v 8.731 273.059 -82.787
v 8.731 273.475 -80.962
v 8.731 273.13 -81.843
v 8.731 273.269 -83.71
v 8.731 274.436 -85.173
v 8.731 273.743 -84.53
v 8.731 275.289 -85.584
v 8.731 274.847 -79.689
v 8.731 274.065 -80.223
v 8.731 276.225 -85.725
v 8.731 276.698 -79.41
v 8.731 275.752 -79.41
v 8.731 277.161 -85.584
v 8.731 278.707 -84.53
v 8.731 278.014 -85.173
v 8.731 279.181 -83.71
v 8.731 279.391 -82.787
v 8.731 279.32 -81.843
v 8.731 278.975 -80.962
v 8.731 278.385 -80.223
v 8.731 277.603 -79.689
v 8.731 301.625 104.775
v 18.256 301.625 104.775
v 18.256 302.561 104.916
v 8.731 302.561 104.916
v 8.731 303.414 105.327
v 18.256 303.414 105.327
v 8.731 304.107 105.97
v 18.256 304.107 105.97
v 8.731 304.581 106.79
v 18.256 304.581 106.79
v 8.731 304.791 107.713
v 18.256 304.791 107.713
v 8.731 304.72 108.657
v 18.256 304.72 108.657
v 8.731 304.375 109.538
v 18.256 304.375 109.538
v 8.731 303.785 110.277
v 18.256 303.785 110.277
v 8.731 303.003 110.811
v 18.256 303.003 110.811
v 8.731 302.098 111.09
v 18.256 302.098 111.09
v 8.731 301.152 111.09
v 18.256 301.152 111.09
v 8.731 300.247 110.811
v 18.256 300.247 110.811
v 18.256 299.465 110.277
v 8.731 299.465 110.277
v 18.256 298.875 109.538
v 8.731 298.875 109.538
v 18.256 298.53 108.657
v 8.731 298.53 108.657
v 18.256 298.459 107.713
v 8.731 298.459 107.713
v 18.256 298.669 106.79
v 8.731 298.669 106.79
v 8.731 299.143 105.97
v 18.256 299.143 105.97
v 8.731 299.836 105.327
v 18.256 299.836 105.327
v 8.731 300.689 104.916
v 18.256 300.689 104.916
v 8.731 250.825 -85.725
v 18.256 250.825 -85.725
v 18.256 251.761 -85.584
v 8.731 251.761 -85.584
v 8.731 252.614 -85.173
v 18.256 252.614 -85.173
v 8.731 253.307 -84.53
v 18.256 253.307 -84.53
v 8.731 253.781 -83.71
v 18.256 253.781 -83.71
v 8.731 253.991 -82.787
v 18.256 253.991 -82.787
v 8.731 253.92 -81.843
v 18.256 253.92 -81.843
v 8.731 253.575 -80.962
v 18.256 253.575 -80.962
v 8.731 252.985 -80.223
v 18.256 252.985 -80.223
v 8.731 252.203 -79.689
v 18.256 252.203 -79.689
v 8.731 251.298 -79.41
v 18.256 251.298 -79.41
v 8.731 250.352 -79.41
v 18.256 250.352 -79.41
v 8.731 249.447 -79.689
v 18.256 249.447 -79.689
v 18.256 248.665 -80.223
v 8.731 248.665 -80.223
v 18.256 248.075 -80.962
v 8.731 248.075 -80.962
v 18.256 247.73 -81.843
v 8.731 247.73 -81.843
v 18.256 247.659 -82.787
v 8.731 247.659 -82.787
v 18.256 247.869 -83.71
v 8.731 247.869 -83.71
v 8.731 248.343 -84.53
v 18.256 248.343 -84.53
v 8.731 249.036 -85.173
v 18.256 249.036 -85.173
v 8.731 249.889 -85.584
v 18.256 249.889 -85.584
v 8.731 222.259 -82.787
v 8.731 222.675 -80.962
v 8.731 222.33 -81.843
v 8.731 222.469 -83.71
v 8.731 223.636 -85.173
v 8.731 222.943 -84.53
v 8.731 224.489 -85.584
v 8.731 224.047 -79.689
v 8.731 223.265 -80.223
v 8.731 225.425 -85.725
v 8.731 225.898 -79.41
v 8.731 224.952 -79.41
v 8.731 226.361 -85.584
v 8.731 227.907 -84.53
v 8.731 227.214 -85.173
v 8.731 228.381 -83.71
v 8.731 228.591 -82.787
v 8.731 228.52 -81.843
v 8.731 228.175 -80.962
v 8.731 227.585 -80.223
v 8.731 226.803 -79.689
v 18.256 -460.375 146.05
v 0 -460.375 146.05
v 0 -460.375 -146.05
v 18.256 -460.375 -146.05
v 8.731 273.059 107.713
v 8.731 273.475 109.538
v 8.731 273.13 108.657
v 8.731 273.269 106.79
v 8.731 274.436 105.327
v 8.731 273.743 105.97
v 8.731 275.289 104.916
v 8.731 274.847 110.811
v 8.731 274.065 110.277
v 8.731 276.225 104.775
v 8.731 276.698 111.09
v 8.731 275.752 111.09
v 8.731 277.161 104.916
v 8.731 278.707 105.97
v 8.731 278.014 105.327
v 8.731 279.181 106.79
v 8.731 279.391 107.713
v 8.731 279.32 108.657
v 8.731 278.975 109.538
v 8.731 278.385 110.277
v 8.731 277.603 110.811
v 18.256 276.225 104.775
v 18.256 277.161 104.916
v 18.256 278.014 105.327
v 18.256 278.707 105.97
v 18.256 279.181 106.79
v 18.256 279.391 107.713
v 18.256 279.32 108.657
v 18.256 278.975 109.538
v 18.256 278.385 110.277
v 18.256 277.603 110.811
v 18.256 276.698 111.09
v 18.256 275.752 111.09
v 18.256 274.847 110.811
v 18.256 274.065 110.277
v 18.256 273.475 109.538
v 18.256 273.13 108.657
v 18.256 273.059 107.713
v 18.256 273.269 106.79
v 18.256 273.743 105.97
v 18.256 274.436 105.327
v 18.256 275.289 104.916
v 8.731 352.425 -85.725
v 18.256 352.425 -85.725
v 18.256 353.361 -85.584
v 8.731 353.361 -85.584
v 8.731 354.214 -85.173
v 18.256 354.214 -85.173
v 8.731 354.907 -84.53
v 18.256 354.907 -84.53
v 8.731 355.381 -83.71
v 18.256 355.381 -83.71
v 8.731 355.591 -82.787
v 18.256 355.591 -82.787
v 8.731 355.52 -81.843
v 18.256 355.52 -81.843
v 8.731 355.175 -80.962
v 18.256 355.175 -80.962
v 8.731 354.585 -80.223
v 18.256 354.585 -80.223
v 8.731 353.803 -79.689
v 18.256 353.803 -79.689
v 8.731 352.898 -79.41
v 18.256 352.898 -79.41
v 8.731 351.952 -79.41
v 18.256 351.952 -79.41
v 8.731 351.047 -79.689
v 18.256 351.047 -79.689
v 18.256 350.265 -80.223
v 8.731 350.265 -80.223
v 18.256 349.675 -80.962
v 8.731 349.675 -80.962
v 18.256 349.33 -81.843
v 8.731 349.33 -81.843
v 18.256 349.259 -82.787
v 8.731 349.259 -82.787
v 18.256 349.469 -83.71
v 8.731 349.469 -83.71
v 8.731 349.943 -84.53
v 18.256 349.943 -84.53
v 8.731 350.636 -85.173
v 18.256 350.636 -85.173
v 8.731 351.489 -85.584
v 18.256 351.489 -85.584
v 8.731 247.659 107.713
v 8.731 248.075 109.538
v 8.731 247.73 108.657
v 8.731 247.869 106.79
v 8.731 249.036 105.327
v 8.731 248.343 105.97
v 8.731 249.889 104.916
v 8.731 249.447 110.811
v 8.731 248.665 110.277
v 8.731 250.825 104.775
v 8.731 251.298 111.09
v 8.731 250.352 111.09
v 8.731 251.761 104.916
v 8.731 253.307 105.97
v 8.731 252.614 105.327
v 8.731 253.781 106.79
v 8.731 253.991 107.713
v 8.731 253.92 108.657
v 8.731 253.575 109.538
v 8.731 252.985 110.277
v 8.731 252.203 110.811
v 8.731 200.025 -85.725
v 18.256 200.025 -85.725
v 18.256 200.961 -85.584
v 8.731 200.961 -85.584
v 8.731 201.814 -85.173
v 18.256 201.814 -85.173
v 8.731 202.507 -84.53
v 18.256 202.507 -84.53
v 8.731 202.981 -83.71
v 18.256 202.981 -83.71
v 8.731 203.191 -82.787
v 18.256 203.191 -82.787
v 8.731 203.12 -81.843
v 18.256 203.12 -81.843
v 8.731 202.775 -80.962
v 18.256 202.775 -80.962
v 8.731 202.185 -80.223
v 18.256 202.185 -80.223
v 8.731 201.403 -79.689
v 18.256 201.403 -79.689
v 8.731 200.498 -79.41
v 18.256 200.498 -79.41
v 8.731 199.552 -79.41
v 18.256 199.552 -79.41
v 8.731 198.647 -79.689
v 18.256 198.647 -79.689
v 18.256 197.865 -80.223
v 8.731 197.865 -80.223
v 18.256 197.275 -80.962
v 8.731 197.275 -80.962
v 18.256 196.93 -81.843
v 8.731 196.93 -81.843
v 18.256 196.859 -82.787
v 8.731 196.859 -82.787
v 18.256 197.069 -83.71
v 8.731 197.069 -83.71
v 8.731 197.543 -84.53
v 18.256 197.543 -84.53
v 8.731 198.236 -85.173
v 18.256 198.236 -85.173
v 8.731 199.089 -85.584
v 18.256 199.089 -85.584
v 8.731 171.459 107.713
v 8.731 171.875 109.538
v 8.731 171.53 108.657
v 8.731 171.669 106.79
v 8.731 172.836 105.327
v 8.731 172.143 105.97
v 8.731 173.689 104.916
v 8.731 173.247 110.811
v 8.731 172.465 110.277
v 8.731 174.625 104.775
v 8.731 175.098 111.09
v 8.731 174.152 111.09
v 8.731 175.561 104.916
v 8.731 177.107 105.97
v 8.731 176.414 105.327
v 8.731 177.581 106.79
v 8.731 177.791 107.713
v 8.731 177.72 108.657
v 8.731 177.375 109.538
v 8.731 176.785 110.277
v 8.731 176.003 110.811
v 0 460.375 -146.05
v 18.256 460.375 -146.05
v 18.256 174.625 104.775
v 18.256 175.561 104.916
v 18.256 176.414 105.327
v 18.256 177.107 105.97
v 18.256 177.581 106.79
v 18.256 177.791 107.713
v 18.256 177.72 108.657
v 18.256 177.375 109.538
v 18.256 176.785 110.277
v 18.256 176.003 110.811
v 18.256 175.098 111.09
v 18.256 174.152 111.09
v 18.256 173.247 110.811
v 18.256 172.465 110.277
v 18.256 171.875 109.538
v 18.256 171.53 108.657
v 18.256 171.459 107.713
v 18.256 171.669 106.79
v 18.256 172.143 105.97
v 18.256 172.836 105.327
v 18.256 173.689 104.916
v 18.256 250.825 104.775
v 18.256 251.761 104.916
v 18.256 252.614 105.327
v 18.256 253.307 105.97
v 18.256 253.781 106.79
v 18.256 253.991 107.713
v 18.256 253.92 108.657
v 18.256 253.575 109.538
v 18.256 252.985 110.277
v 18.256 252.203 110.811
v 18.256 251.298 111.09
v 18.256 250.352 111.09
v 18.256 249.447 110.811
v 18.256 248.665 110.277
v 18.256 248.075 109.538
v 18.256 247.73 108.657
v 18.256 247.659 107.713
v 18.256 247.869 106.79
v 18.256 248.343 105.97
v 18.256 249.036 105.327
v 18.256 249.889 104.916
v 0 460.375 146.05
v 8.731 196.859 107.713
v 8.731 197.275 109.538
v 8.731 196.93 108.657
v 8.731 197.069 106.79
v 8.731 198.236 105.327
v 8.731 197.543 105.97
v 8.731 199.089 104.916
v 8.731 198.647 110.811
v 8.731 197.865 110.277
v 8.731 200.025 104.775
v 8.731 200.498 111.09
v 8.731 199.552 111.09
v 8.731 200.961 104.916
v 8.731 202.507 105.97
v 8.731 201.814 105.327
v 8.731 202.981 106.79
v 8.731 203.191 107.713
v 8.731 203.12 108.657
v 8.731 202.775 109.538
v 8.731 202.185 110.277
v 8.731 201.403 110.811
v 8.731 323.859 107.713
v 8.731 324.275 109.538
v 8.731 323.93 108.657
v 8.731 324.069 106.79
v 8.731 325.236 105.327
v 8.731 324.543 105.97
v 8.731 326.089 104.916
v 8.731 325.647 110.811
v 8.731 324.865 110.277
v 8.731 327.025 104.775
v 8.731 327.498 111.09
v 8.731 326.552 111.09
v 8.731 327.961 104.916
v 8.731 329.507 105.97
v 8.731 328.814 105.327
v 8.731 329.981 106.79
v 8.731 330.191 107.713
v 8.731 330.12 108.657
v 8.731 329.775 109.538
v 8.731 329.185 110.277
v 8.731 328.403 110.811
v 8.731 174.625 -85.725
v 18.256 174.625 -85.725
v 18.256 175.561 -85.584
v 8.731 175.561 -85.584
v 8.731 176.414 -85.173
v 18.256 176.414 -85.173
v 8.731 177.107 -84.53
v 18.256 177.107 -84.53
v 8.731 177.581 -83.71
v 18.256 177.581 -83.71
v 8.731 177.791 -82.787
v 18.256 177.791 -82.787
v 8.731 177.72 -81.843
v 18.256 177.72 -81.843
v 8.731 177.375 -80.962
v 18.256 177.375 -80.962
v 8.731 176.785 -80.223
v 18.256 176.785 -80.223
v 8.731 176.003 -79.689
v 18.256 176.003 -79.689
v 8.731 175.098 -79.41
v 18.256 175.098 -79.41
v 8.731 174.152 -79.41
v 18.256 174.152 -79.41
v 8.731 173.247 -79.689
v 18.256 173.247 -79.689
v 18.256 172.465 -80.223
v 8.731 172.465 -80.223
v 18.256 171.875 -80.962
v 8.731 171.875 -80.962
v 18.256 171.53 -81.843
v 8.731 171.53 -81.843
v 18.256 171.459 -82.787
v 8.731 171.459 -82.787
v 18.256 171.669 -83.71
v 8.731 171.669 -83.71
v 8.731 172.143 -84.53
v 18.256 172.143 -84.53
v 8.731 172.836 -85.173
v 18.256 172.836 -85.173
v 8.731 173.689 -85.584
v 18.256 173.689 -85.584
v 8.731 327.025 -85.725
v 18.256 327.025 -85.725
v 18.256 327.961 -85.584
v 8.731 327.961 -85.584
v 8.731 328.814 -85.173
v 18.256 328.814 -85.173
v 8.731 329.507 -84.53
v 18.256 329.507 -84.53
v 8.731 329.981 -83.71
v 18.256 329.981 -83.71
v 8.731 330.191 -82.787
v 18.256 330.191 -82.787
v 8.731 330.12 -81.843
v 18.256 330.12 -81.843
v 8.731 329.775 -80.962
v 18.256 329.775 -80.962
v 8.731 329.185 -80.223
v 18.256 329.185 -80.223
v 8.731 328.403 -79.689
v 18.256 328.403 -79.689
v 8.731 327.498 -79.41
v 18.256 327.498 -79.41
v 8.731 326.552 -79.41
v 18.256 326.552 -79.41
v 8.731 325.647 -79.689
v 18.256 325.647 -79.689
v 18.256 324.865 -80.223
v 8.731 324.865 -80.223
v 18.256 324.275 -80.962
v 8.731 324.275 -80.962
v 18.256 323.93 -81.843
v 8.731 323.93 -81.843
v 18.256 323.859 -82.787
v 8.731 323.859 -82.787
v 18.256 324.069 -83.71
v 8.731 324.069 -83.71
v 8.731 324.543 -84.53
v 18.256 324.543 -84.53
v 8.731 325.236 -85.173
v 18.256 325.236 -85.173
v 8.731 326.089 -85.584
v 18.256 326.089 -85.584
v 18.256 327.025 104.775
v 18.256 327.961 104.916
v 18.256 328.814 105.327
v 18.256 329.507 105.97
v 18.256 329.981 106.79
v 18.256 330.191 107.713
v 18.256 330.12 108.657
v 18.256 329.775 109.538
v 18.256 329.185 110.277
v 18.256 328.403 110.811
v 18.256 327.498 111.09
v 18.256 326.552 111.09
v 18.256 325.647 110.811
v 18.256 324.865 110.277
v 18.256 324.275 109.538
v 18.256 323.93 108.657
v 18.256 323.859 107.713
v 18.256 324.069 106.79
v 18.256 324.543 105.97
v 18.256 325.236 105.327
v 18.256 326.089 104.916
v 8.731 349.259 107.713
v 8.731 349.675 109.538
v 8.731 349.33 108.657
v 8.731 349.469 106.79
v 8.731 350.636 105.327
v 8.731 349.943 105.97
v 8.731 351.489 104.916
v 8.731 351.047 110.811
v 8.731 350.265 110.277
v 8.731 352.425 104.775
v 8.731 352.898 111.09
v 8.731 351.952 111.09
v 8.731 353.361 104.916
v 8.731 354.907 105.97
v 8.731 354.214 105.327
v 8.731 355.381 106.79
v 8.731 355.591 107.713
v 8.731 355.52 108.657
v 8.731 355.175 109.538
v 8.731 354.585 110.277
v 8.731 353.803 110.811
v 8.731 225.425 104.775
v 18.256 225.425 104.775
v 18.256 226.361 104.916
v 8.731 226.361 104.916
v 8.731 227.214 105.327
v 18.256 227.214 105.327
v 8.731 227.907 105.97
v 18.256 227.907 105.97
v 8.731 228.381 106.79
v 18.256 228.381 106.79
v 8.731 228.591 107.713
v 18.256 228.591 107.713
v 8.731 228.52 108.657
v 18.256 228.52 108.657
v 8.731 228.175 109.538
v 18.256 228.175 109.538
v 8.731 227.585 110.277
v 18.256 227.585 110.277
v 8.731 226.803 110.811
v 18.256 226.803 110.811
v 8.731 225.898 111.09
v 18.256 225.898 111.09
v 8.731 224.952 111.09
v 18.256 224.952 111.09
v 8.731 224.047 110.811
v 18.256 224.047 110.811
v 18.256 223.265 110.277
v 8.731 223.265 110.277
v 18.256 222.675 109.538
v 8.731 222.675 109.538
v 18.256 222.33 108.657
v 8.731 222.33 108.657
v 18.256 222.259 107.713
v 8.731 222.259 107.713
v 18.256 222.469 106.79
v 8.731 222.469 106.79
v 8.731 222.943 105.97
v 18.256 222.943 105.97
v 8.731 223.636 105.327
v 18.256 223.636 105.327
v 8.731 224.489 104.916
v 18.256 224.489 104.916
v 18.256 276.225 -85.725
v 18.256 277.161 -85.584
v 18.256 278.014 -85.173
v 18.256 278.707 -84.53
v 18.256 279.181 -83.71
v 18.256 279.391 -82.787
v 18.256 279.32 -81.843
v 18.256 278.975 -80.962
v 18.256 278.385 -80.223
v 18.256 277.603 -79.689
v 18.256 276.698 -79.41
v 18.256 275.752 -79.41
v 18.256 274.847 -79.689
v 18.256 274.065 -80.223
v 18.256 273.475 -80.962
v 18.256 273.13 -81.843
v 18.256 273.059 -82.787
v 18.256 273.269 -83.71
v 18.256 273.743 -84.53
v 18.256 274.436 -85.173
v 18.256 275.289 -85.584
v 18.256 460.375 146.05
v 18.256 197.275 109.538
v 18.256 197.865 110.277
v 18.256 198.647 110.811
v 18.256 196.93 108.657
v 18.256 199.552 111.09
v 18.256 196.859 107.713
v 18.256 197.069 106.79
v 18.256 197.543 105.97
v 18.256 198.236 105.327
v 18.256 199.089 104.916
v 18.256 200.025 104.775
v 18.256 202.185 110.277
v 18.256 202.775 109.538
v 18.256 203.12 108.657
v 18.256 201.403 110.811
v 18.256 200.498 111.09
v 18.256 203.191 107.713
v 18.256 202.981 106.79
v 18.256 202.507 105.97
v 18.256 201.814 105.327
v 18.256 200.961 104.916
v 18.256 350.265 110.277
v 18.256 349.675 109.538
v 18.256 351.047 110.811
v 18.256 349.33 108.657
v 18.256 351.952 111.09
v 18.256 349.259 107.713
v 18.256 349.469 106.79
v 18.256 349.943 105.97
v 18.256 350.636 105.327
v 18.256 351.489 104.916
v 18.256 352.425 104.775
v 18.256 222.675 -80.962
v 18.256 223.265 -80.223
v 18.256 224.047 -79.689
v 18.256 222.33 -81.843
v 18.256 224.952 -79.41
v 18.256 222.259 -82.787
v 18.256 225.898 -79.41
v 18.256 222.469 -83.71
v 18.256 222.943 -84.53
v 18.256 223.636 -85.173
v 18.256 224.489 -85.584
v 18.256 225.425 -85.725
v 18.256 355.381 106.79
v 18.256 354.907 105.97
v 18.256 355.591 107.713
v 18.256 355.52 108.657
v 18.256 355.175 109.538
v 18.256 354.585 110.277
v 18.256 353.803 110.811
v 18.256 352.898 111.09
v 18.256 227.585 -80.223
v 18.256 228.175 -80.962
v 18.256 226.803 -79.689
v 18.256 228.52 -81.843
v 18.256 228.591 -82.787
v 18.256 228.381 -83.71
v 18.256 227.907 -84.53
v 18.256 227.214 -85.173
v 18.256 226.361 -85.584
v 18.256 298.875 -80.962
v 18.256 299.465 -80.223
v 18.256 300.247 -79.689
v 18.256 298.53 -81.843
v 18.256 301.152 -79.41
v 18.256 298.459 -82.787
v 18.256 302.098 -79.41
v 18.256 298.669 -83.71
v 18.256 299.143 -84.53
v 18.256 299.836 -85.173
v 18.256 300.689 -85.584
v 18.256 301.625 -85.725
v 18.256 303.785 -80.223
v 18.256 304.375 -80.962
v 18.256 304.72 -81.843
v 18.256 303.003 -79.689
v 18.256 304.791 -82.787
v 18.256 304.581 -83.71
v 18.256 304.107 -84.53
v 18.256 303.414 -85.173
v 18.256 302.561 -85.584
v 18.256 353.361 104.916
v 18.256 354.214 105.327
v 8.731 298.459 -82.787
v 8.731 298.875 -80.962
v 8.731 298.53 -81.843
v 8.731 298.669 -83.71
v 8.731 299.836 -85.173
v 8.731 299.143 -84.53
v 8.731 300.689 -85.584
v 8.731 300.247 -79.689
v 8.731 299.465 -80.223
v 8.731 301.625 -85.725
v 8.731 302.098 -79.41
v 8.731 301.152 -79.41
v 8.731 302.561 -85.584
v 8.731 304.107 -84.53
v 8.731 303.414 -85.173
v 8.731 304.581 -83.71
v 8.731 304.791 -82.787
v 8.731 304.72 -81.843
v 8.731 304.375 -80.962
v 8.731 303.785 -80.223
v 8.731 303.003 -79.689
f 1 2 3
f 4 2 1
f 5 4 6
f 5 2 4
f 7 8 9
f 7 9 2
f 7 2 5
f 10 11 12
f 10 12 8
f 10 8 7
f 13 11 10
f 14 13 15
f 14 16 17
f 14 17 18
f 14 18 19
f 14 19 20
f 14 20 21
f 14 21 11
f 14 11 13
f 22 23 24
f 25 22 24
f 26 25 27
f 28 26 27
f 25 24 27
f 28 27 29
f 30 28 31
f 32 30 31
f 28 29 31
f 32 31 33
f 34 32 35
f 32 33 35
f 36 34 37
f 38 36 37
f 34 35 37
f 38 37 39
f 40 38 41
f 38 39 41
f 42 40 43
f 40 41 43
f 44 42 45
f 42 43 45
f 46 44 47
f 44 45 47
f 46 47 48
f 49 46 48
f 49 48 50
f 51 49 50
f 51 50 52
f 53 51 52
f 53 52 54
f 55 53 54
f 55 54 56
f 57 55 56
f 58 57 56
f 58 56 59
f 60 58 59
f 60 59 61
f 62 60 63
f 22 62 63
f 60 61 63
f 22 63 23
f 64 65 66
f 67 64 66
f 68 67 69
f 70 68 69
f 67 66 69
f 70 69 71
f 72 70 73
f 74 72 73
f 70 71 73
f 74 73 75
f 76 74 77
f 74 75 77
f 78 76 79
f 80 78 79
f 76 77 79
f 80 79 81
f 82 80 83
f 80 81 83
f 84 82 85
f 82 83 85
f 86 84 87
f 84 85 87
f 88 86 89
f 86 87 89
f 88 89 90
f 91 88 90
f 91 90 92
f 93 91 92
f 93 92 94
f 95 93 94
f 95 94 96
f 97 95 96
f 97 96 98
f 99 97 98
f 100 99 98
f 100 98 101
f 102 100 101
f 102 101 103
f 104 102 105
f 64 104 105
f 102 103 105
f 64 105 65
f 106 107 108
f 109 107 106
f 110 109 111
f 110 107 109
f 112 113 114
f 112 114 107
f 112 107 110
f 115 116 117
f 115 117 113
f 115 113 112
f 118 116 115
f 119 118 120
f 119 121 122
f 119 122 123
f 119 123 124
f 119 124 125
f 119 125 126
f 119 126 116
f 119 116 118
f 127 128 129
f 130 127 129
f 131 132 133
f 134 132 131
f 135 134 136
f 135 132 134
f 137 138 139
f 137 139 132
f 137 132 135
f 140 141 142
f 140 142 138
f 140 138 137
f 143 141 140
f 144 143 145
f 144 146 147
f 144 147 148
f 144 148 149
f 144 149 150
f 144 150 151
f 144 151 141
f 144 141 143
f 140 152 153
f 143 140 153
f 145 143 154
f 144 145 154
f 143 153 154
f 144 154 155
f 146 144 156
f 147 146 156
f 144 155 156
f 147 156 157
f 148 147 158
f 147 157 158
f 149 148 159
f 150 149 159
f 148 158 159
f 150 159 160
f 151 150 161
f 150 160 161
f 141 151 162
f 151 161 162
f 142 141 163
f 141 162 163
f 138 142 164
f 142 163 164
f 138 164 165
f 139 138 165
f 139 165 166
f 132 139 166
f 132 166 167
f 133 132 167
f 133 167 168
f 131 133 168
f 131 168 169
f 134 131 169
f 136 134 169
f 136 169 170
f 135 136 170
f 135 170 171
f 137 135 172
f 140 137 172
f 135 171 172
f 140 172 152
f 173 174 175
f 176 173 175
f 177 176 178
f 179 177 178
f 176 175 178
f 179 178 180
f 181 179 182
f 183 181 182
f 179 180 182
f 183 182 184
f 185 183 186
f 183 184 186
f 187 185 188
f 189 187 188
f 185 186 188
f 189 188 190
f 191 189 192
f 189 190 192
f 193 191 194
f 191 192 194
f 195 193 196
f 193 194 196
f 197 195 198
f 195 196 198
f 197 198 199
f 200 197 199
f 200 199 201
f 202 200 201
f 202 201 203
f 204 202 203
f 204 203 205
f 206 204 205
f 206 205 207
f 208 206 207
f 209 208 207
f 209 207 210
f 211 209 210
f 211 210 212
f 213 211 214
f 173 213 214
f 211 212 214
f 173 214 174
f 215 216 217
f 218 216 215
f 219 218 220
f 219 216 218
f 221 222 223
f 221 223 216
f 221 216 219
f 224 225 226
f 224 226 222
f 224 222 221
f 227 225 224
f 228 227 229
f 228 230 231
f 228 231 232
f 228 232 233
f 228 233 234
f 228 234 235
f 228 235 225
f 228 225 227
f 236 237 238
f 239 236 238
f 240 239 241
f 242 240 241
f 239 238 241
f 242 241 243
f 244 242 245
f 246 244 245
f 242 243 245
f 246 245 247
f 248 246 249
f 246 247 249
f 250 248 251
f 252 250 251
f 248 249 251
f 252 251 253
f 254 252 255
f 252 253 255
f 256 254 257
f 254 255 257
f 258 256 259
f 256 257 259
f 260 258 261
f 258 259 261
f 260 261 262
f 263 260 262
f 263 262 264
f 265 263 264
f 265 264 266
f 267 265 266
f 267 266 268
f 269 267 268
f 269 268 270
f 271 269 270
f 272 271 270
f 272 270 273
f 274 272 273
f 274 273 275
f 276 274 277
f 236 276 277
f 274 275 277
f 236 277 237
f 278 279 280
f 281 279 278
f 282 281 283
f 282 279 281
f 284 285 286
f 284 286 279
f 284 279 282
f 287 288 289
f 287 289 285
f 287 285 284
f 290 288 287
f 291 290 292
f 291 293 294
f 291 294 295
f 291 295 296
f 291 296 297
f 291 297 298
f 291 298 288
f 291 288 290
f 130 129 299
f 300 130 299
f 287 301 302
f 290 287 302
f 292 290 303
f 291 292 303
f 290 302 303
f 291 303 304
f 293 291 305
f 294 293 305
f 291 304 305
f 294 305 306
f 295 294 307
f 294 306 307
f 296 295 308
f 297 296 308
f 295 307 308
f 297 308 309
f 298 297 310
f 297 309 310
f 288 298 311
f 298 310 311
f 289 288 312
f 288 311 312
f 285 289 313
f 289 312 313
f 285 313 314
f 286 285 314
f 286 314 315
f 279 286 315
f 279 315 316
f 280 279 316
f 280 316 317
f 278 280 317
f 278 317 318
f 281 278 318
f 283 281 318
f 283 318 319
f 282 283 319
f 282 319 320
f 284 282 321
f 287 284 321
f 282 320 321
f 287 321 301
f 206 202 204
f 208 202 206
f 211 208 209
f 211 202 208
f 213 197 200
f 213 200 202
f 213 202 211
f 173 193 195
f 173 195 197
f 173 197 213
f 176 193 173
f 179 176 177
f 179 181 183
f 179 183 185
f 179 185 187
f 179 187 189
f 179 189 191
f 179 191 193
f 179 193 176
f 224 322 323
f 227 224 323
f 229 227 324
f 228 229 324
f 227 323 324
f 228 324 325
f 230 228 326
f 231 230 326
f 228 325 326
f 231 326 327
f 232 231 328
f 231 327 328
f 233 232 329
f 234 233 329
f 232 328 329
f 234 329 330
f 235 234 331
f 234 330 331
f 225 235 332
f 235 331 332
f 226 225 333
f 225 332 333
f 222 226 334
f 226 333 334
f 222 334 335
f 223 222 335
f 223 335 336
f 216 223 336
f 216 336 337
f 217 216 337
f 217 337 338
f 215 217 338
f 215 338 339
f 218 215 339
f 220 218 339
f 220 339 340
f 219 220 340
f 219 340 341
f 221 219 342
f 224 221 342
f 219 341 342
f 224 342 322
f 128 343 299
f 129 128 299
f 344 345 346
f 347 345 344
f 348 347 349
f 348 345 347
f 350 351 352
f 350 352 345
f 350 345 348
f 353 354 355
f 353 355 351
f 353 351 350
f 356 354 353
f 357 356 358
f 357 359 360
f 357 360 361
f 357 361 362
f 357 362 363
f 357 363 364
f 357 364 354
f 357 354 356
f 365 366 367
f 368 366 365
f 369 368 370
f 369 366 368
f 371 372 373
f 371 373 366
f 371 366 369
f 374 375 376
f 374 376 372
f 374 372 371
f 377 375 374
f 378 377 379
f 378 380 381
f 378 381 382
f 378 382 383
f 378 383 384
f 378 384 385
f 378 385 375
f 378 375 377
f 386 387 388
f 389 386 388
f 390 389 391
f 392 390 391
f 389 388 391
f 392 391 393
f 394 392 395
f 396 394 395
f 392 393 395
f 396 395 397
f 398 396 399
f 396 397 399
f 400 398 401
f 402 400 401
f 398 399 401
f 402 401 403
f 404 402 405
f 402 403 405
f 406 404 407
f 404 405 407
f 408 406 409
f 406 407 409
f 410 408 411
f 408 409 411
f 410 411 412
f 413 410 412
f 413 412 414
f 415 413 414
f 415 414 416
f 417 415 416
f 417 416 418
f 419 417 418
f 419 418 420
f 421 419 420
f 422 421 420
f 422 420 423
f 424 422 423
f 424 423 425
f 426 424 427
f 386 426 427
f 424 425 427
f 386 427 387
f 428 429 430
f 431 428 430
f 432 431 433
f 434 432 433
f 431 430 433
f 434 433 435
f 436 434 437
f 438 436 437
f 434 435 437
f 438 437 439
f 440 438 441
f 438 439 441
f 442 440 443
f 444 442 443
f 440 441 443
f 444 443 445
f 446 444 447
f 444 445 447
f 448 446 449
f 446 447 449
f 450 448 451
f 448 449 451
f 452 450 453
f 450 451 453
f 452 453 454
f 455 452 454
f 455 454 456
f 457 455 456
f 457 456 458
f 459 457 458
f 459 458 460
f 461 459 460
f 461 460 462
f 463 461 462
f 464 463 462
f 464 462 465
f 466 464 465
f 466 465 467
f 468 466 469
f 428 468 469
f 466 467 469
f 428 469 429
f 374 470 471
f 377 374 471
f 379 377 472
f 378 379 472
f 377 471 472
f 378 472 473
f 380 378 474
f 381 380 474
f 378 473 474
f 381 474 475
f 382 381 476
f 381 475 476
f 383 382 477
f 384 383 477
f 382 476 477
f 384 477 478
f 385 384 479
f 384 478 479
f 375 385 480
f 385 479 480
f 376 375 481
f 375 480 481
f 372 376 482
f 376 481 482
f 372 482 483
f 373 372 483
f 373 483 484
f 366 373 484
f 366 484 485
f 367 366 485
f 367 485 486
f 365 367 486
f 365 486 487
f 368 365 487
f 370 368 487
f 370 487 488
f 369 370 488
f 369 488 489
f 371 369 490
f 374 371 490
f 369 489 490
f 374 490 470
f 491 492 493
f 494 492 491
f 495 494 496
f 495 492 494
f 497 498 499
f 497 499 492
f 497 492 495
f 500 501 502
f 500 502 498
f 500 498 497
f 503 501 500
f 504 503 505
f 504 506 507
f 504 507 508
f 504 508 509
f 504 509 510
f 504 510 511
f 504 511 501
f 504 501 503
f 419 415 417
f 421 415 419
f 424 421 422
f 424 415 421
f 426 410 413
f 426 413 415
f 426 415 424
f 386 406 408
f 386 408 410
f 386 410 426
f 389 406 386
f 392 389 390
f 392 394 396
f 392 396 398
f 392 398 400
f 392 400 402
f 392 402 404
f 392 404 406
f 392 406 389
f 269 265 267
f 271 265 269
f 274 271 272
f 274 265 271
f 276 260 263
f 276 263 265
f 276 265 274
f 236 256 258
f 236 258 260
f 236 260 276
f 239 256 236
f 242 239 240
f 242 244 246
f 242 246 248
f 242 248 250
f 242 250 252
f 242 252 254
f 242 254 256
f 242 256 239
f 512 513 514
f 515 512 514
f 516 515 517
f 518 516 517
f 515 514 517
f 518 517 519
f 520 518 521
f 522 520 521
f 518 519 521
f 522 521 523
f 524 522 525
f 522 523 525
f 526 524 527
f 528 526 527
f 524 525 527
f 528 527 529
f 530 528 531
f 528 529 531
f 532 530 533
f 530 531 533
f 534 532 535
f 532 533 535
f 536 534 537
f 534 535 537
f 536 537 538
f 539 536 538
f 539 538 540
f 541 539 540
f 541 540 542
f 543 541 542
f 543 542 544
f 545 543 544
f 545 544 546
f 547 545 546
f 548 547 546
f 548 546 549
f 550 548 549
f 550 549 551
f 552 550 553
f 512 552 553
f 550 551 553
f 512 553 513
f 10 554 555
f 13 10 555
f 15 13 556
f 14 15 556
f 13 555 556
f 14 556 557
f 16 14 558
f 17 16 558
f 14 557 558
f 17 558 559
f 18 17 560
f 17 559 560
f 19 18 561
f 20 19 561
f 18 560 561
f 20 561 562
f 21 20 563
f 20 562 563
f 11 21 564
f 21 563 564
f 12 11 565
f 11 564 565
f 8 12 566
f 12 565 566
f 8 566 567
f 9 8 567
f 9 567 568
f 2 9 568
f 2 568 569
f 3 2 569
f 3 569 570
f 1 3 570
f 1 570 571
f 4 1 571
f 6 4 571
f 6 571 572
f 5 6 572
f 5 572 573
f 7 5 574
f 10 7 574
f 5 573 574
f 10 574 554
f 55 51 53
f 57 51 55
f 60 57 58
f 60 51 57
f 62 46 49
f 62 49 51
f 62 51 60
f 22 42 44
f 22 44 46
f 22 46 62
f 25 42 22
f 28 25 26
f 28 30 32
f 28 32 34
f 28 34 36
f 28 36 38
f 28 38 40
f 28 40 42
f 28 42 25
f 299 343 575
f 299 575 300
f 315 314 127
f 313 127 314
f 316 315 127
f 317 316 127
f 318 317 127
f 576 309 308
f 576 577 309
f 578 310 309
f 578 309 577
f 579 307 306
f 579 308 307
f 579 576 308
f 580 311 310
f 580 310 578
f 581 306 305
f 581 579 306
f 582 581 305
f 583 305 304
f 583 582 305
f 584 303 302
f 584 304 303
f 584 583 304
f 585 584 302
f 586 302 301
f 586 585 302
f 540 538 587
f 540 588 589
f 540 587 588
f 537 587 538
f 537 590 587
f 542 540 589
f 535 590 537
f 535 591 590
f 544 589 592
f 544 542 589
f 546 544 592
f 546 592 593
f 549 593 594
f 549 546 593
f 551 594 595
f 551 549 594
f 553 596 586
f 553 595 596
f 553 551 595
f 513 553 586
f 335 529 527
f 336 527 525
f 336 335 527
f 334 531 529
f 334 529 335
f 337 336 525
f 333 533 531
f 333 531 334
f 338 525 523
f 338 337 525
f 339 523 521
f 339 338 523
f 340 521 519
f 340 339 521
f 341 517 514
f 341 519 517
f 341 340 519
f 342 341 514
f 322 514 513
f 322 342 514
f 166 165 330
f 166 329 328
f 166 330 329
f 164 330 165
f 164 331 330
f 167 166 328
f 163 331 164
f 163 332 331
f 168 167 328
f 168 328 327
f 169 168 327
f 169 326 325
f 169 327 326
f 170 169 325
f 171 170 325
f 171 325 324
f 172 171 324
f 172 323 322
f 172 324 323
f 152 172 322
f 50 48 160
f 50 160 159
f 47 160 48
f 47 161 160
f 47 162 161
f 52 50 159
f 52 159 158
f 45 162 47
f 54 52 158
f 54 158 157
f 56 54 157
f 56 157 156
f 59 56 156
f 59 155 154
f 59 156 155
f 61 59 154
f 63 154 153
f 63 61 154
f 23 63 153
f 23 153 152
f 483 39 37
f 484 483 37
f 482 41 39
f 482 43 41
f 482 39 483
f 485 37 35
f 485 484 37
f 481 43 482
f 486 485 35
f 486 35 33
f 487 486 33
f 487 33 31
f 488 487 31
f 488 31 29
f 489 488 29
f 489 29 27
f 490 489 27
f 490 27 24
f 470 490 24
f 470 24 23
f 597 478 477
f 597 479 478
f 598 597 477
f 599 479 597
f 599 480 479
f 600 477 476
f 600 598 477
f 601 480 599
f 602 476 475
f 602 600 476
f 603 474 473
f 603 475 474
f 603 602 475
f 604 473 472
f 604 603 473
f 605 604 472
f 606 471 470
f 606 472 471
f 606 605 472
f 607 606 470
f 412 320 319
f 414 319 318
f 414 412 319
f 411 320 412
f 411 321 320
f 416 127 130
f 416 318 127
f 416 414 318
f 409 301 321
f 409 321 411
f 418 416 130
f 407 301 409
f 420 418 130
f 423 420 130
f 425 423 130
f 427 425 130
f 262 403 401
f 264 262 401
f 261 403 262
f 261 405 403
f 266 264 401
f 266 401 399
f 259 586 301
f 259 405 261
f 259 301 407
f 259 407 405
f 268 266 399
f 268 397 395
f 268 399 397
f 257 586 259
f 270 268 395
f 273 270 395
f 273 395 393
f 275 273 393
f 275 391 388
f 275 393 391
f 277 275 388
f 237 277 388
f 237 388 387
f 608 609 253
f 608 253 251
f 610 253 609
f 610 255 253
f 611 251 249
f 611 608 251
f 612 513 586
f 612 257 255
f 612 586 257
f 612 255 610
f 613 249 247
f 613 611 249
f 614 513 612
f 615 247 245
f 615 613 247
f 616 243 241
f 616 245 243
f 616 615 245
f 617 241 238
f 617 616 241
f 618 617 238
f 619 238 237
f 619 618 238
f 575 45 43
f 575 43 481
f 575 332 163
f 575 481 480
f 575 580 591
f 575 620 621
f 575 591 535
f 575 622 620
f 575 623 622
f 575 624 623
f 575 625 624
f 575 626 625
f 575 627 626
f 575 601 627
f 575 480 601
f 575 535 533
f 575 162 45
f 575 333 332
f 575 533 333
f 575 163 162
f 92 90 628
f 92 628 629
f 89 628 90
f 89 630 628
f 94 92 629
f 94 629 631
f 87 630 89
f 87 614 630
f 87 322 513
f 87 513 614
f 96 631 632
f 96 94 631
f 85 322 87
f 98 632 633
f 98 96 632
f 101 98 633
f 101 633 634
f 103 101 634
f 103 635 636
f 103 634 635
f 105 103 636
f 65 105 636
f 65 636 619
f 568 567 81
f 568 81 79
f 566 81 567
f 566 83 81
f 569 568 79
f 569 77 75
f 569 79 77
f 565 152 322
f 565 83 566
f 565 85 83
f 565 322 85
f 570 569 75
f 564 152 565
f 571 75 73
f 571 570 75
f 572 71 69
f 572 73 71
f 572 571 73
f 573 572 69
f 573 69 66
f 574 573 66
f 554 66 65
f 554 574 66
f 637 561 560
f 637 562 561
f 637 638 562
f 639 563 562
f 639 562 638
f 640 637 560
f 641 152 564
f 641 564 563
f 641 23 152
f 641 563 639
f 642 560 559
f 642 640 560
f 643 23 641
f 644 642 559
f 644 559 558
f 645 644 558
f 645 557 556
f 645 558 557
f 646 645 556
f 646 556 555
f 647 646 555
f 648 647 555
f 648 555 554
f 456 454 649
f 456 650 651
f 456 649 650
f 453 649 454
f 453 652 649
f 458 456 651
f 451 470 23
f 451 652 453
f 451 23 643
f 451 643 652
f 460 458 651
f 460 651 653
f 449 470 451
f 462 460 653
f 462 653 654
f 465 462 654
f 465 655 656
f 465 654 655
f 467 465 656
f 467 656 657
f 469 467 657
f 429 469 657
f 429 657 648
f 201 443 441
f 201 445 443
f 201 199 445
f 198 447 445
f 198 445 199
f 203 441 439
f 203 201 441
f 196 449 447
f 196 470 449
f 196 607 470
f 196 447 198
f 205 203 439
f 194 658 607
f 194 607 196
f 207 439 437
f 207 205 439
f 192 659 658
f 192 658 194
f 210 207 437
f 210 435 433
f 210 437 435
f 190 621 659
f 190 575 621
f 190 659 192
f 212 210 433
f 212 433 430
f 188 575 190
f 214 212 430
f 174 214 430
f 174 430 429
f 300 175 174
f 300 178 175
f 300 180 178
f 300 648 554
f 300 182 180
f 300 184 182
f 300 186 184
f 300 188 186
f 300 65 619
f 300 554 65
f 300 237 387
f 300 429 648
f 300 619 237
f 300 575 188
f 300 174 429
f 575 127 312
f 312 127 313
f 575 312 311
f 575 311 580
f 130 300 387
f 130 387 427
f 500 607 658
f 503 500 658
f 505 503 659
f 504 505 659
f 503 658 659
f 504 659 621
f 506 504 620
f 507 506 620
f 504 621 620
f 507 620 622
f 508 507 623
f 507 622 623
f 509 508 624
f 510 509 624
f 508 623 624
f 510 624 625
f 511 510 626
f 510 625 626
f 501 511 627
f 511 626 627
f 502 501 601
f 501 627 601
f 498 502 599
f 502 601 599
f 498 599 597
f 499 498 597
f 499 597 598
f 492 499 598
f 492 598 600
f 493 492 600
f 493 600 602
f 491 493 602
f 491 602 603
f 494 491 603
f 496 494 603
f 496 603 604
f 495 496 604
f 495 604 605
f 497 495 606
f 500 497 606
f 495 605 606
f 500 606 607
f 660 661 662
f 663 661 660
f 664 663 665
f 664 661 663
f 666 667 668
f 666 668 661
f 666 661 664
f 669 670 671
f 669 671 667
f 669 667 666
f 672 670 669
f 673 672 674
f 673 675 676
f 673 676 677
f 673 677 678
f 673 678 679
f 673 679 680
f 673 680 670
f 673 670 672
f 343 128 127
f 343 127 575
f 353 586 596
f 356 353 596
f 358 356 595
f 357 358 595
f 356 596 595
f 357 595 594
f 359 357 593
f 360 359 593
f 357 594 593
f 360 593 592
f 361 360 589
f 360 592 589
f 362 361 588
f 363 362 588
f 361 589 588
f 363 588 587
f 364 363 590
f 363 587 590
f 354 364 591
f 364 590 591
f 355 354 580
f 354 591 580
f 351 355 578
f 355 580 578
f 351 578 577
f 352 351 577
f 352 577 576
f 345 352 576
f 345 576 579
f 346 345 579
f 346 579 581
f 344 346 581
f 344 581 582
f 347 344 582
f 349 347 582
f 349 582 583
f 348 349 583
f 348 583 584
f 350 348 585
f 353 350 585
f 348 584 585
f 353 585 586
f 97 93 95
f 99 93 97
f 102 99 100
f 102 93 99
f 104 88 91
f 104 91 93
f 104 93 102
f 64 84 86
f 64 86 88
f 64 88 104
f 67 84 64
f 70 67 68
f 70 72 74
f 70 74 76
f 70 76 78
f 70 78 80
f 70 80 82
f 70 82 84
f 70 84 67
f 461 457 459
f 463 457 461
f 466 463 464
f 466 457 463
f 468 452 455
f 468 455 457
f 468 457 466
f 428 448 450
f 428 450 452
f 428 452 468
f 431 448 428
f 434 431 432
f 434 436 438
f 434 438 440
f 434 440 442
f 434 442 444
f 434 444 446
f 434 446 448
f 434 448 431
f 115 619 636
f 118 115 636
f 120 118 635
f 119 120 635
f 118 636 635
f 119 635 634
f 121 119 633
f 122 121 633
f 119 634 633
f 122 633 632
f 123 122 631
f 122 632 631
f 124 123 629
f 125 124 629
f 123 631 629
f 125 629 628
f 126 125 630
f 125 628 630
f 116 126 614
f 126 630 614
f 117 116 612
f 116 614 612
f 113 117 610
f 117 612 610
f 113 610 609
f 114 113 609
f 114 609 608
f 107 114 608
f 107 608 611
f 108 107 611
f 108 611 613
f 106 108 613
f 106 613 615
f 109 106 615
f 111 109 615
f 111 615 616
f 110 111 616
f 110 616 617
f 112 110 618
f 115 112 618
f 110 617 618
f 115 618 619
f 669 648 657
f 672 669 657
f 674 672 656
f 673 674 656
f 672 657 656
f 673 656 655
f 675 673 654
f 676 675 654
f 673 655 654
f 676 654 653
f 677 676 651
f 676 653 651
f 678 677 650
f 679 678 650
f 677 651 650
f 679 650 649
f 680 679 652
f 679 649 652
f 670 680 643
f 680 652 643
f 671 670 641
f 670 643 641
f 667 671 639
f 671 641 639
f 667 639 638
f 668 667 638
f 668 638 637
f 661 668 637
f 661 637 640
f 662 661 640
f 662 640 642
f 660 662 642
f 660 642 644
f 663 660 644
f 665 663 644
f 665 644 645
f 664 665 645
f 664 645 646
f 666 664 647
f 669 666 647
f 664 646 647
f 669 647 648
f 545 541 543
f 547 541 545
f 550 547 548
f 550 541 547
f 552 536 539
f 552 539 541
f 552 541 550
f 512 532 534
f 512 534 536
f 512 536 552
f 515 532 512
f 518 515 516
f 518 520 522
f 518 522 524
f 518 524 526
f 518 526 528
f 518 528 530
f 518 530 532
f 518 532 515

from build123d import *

# Parameters (mm, degrees)
SKETCH1_W           = 292.1
SKETCH1_H           = 920.75
BOSS_EXTRUDE1_DEPTH = 18.25625
SKETCH3_R           = 3.175
CUT_EXTRUDE1_DEPTH  = 9.525


with BuildPart() as part:
    # Sketch1 → Boss-Extrude1 (new body)
    with BuildSketch(Plane(origin=(0, 0, 0), x_dir=(0, 0, -1), z_dir=(1, 0, 0))):
        Rectangle(SKETCH1_W, SKETCH1_H)
    extrude(amount=BOSS_EXTRUDE1_DEPTH)

    # Sketch3 → Cut-Extrude1 (cut)
    with BuildSketch(Plane(origin=(18.25625, 0, 0), x_dir=(0, 0, -1), z_dir=(1, 0, 0))):
        with Locations((-107.95, 352.425)):
            Circle(SKETCH3_R)
        with Locations((-107.95, 327.025)):
            Circle(SKETCH3_R)
        with Locations((-107.95, 301.625)):
            Circle(SKETCH3_R)
        with Locations((-107.95, 276.225)):
            Circle(SKETCH3_R)
        with Locations((-107.95, 250.825)):
            Circle(SKETCH3_R)
        with Locations((-107.95, 225.425)):
            Circle(SKETCH3_R)
        with Locations((-107.95, 200.025)):
            Circle(SKETCH3_R)
        with Locations((-107.95, 174.625)):
            Circle(SKETCH3_R)
        with Locations((82.55, 174.625)):
            Circle(SKETCH3_R)
        with Locations((82.55, 200.025)):
            Circle(SKETCH3_R)
        with Locations((82.55, 225.425)):
            Circle(SKETCH3_R)
        with Locations((82.55, 250.825)):
            Circle(SKETCH3_R)
        with Locations((82.55, 276.225)):
            Circle(SKETCH3_R)
        with Locations((82.55, 301.625)):
            Circle(SKETCH3_R)
        with Locations((82.55, 327.025)):
            Circle(SKETCH3_R)
        with Locations((82.55, 352.425)):
            Circle(SKETCH3_R)
    extrude(amount=-CUT_EXTRUDE1_DEPTH, mode=Mode.SUBTRACT)


solid = part.part
